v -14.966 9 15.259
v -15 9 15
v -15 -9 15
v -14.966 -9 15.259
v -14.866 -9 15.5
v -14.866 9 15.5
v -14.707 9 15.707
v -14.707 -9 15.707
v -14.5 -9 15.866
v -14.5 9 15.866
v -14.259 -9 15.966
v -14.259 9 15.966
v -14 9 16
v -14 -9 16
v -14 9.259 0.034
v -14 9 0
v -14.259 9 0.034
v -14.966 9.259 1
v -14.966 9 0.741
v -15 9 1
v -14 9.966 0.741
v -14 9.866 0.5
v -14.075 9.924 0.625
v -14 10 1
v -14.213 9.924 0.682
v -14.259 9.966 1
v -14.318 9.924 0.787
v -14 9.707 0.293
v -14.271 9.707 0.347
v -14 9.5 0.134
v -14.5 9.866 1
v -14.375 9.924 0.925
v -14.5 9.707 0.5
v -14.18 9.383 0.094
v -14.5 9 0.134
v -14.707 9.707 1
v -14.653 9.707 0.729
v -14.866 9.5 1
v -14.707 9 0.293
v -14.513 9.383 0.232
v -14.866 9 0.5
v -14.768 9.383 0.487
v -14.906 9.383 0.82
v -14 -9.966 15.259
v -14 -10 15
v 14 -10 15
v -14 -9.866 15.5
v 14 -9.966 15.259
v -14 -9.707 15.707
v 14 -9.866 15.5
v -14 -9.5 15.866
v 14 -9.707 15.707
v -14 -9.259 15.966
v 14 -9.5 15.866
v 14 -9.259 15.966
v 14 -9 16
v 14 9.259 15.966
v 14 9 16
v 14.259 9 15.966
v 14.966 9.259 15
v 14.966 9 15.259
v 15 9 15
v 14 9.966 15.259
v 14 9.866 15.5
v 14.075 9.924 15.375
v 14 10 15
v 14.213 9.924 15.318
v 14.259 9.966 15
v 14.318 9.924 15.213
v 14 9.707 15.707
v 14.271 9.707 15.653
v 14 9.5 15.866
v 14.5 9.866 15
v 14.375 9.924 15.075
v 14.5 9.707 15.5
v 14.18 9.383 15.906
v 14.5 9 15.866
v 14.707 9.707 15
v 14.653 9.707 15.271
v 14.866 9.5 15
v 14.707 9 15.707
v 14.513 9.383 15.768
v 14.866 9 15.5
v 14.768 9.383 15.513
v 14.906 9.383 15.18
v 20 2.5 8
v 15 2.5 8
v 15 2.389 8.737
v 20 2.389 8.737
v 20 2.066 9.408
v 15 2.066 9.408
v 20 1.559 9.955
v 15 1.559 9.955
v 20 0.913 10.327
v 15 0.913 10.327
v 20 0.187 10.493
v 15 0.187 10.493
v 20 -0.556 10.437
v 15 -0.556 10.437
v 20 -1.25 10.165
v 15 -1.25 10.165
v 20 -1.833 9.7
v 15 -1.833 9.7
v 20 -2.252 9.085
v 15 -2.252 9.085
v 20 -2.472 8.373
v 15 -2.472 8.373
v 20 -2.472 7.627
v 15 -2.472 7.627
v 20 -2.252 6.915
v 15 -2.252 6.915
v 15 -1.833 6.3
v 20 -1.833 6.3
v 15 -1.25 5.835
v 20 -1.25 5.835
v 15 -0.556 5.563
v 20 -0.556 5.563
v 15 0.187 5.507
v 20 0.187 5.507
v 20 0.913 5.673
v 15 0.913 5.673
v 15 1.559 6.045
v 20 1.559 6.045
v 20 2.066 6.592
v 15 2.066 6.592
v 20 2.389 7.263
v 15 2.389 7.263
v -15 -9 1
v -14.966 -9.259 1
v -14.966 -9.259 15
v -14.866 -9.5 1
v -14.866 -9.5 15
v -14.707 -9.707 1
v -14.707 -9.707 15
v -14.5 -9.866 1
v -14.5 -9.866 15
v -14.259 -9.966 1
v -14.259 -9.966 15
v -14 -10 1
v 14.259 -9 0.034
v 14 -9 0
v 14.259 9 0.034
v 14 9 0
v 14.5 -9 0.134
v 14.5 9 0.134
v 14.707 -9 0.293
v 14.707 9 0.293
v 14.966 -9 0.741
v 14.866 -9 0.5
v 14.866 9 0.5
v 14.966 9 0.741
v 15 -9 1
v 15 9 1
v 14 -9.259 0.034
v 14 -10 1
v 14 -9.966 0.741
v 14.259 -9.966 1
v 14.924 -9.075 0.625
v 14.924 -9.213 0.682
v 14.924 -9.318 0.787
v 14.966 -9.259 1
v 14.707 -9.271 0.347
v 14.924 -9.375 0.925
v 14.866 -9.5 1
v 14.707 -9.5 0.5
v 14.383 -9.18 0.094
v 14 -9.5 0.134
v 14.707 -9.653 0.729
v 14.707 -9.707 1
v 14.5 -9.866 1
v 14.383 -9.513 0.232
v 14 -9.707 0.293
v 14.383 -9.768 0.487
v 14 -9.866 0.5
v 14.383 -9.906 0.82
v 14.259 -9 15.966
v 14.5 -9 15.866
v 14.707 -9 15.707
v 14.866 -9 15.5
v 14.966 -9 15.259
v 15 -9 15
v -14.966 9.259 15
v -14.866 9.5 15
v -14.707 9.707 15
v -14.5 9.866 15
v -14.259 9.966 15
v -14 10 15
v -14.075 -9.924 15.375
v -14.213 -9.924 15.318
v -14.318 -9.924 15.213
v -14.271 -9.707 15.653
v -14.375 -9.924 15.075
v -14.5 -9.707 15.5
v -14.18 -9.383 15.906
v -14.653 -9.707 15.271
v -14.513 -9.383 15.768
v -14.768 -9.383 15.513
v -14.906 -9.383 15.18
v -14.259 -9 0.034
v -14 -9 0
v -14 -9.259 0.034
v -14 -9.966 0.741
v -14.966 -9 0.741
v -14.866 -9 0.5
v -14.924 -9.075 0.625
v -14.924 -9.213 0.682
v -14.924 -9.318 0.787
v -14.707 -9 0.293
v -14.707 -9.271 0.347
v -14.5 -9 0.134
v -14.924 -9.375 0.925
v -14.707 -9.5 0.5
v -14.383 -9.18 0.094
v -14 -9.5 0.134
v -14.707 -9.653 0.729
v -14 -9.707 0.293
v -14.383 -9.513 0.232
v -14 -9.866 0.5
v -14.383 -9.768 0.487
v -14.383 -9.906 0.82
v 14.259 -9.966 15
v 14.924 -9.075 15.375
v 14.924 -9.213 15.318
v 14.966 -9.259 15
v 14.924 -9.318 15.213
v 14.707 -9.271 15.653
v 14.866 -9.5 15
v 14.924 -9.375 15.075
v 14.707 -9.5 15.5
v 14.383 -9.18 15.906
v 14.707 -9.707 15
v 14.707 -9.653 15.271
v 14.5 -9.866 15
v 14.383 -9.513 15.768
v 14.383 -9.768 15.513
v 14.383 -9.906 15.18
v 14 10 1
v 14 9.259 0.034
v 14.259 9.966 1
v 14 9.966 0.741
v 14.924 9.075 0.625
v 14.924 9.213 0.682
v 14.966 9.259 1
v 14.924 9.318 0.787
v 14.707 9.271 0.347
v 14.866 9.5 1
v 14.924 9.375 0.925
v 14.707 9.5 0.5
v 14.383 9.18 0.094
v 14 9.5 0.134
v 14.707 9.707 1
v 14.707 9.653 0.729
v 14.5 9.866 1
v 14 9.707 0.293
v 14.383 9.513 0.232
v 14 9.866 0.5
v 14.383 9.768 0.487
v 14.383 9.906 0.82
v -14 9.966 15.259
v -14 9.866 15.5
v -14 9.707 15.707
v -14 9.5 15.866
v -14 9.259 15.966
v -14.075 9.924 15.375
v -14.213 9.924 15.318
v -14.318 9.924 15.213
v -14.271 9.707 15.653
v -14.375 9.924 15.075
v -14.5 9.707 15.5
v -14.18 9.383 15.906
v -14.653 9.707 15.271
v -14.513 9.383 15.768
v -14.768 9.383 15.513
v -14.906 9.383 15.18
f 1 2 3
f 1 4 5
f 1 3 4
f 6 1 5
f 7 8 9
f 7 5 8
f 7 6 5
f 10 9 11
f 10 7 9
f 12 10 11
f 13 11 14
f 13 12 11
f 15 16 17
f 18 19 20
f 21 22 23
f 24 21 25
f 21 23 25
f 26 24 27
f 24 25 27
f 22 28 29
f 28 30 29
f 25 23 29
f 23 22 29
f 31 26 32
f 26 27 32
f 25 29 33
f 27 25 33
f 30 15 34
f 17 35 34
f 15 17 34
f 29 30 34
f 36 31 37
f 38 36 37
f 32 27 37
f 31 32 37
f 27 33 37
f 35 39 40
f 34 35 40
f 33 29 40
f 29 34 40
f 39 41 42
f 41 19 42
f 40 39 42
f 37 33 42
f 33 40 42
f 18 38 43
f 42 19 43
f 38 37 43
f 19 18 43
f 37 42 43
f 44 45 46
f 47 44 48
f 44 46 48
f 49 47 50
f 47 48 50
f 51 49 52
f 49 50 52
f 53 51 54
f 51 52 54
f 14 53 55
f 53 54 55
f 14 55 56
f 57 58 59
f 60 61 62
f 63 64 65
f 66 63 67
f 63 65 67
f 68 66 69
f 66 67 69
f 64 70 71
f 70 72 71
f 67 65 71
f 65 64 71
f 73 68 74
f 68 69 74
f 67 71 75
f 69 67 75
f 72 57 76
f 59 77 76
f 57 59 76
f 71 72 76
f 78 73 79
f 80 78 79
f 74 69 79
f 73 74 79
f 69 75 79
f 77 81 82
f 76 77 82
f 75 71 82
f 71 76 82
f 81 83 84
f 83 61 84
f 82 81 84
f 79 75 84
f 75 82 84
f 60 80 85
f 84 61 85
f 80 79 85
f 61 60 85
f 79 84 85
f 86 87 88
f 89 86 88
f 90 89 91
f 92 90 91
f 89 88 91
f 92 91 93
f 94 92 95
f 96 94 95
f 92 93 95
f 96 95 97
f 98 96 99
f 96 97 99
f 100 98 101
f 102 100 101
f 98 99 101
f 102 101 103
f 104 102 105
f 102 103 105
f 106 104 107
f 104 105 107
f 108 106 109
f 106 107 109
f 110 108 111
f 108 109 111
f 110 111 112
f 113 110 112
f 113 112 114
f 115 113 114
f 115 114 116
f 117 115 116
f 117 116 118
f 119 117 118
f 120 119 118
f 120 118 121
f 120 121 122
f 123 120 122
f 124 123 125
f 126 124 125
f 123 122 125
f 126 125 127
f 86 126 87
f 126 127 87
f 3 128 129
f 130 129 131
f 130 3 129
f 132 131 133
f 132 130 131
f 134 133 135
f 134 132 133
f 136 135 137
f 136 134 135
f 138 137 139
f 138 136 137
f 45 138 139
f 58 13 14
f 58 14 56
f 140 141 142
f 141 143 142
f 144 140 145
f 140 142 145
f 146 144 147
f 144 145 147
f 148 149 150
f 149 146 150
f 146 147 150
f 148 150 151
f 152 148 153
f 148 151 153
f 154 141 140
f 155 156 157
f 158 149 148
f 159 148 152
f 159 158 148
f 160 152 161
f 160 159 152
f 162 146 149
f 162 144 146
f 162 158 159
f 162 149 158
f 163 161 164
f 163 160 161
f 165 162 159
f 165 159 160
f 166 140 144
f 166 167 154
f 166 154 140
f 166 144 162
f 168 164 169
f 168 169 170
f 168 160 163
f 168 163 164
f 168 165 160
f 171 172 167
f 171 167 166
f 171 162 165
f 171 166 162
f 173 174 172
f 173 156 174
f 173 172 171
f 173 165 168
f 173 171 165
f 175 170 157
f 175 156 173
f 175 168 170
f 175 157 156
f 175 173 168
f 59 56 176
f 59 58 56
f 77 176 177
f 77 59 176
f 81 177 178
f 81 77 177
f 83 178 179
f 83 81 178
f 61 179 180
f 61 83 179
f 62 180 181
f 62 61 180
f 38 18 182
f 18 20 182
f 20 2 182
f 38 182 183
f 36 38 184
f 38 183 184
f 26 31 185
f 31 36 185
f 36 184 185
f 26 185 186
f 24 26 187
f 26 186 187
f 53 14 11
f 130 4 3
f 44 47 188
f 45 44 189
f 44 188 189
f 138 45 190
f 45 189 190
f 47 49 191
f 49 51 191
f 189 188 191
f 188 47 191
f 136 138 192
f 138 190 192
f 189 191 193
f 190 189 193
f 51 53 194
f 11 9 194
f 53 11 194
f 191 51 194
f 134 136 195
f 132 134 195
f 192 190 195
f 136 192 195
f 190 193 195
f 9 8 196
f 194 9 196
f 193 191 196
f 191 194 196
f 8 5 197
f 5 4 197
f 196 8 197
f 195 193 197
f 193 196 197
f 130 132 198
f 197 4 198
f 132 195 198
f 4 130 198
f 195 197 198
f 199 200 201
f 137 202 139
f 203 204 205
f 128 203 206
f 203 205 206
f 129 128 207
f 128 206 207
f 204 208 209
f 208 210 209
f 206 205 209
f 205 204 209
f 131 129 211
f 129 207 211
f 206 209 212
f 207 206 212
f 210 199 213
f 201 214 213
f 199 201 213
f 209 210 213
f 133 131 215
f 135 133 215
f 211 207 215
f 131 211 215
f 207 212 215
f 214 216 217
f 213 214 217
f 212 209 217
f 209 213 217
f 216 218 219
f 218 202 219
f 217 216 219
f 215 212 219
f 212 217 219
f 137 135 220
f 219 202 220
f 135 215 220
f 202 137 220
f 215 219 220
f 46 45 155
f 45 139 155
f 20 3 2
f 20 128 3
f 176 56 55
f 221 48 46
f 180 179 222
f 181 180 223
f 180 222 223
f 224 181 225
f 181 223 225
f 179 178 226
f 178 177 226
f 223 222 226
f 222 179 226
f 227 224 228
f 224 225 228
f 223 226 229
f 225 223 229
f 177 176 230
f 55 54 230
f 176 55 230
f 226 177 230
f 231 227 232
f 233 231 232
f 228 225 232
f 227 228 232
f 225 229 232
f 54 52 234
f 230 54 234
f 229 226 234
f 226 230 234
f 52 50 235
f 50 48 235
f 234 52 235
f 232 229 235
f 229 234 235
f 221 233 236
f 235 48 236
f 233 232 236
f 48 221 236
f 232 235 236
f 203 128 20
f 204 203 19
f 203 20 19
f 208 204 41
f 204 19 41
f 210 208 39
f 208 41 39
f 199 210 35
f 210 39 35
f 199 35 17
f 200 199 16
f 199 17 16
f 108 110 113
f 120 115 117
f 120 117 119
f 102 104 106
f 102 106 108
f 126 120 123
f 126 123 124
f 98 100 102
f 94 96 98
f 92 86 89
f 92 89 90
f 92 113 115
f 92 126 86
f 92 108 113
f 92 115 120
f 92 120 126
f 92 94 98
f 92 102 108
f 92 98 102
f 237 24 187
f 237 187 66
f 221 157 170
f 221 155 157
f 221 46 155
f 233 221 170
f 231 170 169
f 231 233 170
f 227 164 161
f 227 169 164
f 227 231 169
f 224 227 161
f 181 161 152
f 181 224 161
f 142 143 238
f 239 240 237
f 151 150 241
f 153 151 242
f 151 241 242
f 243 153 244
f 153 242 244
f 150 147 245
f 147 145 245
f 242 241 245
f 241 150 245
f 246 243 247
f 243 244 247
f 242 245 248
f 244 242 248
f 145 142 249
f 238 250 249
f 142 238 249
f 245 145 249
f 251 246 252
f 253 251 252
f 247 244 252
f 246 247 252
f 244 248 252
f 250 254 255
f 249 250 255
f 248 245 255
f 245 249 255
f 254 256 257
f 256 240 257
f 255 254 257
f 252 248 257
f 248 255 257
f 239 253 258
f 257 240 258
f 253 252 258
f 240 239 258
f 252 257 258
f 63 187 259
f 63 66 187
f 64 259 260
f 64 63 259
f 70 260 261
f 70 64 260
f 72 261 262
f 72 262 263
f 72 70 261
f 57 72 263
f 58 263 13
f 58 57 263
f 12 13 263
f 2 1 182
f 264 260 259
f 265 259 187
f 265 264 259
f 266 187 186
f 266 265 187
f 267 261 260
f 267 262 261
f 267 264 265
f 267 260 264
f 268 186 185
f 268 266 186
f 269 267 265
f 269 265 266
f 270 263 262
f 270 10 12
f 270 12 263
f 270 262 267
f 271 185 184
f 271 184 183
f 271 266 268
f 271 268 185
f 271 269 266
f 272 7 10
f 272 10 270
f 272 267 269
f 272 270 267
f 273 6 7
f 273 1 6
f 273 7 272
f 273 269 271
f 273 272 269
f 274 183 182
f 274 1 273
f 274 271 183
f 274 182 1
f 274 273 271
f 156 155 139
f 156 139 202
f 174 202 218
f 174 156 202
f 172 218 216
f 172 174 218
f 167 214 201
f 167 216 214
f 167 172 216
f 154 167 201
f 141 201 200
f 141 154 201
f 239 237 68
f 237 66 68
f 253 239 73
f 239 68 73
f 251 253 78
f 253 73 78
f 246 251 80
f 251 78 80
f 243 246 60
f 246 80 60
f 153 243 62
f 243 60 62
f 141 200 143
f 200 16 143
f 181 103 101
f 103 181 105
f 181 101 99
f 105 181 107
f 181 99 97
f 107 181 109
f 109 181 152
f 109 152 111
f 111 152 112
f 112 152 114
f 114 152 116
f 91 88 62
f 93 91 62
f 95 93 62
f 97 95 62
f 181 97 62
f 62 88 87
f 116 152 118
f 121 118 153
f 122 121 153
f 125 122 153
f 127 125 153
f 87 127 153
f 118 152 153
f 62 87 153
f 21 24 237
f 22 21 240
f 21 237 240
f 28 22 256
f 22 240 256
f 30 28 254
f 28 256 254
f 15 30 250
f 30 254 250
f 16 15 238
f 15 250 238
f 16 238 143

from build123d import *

# Parameters (mm, degrees)
SKETCH_1_W      = 30
SKETCH_1_H      = 20
EXTRUDE_1_DEPTH = 16
SKETCH_2_R      = 2.5
EXTRUDE_2_DEPTH = 5
FILLET_1_R      = 1


with BuildPart() as part:
    # 草图1 → 凸台-拉伸1 (new body)
    with BuildSketch(Plane.XY):
        Rectangle(SKETCH_1_W, SKETCH_1_H)
    extrude(amount=EXTRUDE_1_DEPTH)

    # 草图2 → 凸台-拉伸2 (add)
    with BuildSketch(Plane(origin=(15, 0, 0), x_dir=(0, 0, -1), z_dir=(1, 0, 0))):
        with Locations(Location((-8, 0, 0), (0, 0, 90))):
            Circle(SKETCH_2_R)
    extrude(amount=EXTRUDE_2_DEPTH)

    # 圆角1
    fillet_1_edges = [part.edges().sort_by_distance(p)[0] for p in [
        (-15, 0, 16),
        (0, -10, 16),
        (15, 0, 16),
        (0, -10, 0),
        (-15, 0, 0),
        (0, 10, 0),
        (15, 0, 0),
        (0, 10, 16),
        (15, -10, 8),
        (-15, -10, 8),
        (-15, 10, 8),
        (15, 10, 8),
    ]]
    fillet(fillet_1_edges, radius=FILLET_1_R)


solid = part.part
